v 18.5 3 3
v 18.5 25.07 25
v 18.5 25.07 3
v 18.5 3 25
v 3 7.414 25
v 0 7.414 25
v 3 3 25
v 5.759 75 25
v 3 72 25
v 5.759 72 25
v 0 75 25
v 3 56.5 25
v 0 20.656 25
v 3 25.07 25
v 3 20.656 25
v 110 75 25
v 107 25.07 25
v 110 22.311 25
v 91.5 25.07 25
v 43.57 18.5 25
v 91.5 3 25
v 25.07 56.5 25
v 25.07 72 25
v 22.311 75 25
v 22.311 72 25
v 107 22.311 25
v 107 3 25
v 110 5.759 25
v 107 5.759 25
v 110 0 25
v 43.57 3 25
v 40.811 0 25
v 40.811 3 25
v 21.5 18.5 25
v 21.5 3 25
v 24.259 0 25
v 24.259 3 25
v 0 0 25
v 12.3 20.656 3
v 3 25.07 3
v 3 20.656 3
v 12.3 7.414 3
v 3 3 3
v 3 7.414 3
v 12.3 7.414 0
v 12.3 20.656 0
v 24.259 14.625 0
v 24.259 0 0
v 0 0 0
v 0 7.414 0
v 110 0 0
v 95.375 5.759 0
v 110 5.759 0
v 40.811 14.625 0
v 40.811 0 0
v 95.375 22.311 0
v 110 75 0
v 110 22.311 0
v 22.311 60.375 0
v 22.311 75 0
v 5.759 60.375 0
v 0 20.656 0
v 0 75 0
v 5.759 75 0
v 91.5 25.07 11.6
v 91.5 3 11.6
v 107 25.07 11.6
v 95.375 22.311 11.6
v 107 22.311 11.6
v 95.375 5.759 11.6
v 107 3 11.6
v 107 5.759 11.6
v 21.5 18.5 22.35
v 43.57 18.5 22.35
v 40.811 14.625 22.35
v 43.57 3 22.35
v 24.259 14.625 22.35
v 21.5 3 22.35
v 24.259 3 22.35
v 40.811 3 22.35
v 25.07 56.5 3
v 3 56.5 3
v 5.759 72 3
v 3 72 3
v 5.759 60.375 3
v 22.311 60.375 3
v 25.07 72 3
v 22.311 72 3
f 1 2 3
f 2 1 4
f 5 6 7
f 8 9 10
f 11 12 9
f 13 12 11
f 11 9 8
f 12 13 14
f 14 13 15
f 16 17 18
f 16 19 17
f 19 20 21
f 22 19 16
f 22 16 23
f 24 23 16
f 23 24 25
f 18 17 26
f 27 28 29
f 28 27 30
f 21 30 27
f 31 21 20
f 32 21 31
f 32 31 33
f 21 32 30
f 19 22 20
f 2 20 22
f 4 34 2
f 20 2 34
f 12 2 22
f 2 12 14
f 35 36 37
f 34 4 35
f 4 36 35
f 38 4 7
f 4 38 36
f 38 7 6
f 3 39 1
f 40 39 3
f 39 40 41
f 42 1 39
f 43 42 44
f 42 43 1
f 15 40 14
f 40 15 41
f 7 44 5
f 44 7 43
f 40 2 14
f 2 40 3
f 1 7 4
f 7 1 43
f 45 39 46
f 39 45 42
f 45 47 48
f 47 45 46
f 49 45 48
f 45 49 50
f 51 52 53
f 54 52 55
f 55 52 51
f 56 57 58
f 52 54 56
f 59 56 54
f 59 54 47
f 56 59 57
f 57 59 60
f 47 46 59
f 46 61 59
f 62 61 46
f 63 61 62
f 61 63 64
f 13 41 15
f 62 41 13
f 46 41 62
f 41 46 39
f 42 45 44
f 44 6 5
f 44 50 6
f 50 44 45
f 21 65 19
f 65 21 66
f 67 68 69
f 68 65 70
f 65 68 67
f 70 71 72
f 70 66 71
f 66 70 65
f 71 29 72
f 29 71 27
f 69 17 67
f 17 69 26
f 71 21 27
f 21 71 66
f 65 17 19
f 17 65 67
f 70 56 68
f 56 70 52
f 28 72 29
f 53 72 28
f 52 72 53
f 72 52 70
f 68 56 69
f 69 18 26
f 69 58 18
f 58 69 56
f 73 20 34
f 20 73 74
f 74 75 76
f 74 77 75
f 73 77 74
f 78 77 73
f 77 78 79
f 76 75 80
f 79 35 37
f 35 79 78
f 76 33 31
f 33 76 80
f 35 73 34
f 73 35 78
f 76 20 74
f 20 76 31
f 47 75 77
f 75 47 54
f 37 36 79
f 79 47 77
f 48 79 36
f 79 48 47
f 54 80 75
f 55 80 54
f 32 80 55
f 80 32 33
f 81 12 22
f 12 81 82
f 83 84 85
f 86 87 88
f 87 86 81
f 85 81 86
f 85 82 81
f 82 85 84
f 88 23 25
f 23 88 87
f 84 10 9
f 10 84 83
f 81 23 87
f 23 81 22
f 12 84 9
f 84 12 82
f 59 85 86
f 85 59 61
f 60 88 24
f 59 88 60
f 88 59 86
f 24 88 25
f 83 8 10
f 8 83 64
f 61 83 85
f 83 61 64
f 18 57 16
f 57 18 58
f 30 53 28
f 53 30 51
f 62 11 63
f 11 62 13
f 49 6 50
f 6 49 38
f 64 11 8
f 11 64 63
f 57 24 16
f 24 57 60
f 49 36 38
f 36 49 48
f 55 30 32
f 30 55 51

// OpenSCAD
// file: SquarePileLib.scad
module LeftPile(wallThickness, totalHeight, singlePileHeight, singlePileWidth, singlePileLength, pileCount, openingSizePercent = .75){
    pileHeight = (pileCount * singlePileHeight) + .5;
    lengthOpeningSize = singlePileLength * openingSizePercent;
    widthOpeningSize = singlePileWidth * openingSizePercent;
    blockerSize = (singlePileWidth - widthOpeningSize) / 2;
    
    translate([wallThickness, wallThickness, totalHeight - pileHeight])
        cube([singlePileLength, singlePileWidth, pileHeight]);
    translate([-.00001, wallThickness + (blockerSize), 0])
        cube([wallThickness + lengthOpeningSize, widthOpeningSize, totalHeight]);
}

module RightPile(wallThickness, totalHeight, singlePileHeight, singlePileWidth, singlePileLength, pileCount, openingSizePercent = .75){
    translate([0, wallThickness + wallThickness + singlePileWidth, 0])
        rotate([0, 0, 180])
            LeftPile(wallThickness, totalHeight, singlePileHeight, singlePileWidth, singlePileLength, pileCount);
}

module BottomPile(wallThickness, totalHeight, singlePileHeight, singlePileWidth, singlePileLength, pileCount, openingSizePercent = .75){
    translate([wallThickness + wallThickness + singlePileWidth, 0, 0])
        rotate([0, 0, 90])
            LeftPile(wallThickness, totalHeight, singlePileHeight, singlePileWidth, singlePileLength, pileCount);
}

module TopPile(wallThickness, totalHeight, singlePileHeight, singlePileWidth, singlePileLength, pileCount, openingSizePercent = .75){
        rotate([0, 0, 270])
            LeftPile(wallThickness, totalHeight, singlePileHeight, singlePileWidth, singlePileLength, pileCount);
}
// file: ColonistsTool1xLib.scad
include<SquarePileLib.scad>
//25.82 by 32.82 by 2.15
singleTool1xPileHeight = 2.15;
singleTool1xPileWidth = 21.57 + .5;
singleTool1xPileLength = 15 + .5;

module LeftTool1xPile(wallThickness, totalHeight, tool1xPileCount){
    LeftPile(
        wallThickness,
        totalHeight,
        singleTool1xPileHeight,
        singleTool1xPileWidth,
        singleTool1xPileLength,
        tool1xPileCount,
        .6);
}

module RightTool1xPile(wallThickness, totalHeight, tool1xPileCount){
    RightPile(
        wallThickness,
        totalHeight,
        singleTool1xPileHeight,
        singleTool1xPileWidth,
        singleTool1xPileLength,
        tool1xPileCount,
        .6);
}

module BottomTool1xPile(wallThickness, totalHeight, tool1xPileCount){
    BottomPile(
        wallThickness,
        totalHeight,
        singleTool1xPileHeight,
        singleTool1xPileWidth,
        singleTool1xPileLength,
        tool1xPileCount,
        .6);
}

module TopTool1xPile(wallThickness, totalHeight, tool1xPileCount){
    TopPile(
        wallThickness,
        totalHeight,
        singleTool1xPileHeight,
        singleTool1xPileWidth,
        singleTool1xPileLength,
        tool1xPileCount,
        .6);
}

function tool1xPileHeight(tool1xPileCount) =
    (tool1xPileCount * singleTool1xPileHeight) + .5;
// main file
include<ColonistsTool1xLib.scad>
difference() {
    testBoxHeight = tool1xPileHeight(10) + 3;
    testBoxLength = 110;
    testBoxWidth = 75;
    wallThickness = 3;
    
    cube([testBoxLength, testBoxWidth, testBoxHeight]);
    LeftTool1xPile(wallThickness, testBoxHeight, 10);
//    translate([100 - (15.05 + .8), 0, 0])
    translate([testBoxLength, 0, 0])
        RightTool1xPile(wallThickness, testBoxHeight, 6);
    translate([singleTool1xPileLength + wallThickness, 0, 0])
        BottomTool1xPile(wallThickness, testBoxHeight, 1);
    translate([0, testBoxWidth, 0])
        TopTool1xPile(wallThickness, testBoxHeight, 10);
}
